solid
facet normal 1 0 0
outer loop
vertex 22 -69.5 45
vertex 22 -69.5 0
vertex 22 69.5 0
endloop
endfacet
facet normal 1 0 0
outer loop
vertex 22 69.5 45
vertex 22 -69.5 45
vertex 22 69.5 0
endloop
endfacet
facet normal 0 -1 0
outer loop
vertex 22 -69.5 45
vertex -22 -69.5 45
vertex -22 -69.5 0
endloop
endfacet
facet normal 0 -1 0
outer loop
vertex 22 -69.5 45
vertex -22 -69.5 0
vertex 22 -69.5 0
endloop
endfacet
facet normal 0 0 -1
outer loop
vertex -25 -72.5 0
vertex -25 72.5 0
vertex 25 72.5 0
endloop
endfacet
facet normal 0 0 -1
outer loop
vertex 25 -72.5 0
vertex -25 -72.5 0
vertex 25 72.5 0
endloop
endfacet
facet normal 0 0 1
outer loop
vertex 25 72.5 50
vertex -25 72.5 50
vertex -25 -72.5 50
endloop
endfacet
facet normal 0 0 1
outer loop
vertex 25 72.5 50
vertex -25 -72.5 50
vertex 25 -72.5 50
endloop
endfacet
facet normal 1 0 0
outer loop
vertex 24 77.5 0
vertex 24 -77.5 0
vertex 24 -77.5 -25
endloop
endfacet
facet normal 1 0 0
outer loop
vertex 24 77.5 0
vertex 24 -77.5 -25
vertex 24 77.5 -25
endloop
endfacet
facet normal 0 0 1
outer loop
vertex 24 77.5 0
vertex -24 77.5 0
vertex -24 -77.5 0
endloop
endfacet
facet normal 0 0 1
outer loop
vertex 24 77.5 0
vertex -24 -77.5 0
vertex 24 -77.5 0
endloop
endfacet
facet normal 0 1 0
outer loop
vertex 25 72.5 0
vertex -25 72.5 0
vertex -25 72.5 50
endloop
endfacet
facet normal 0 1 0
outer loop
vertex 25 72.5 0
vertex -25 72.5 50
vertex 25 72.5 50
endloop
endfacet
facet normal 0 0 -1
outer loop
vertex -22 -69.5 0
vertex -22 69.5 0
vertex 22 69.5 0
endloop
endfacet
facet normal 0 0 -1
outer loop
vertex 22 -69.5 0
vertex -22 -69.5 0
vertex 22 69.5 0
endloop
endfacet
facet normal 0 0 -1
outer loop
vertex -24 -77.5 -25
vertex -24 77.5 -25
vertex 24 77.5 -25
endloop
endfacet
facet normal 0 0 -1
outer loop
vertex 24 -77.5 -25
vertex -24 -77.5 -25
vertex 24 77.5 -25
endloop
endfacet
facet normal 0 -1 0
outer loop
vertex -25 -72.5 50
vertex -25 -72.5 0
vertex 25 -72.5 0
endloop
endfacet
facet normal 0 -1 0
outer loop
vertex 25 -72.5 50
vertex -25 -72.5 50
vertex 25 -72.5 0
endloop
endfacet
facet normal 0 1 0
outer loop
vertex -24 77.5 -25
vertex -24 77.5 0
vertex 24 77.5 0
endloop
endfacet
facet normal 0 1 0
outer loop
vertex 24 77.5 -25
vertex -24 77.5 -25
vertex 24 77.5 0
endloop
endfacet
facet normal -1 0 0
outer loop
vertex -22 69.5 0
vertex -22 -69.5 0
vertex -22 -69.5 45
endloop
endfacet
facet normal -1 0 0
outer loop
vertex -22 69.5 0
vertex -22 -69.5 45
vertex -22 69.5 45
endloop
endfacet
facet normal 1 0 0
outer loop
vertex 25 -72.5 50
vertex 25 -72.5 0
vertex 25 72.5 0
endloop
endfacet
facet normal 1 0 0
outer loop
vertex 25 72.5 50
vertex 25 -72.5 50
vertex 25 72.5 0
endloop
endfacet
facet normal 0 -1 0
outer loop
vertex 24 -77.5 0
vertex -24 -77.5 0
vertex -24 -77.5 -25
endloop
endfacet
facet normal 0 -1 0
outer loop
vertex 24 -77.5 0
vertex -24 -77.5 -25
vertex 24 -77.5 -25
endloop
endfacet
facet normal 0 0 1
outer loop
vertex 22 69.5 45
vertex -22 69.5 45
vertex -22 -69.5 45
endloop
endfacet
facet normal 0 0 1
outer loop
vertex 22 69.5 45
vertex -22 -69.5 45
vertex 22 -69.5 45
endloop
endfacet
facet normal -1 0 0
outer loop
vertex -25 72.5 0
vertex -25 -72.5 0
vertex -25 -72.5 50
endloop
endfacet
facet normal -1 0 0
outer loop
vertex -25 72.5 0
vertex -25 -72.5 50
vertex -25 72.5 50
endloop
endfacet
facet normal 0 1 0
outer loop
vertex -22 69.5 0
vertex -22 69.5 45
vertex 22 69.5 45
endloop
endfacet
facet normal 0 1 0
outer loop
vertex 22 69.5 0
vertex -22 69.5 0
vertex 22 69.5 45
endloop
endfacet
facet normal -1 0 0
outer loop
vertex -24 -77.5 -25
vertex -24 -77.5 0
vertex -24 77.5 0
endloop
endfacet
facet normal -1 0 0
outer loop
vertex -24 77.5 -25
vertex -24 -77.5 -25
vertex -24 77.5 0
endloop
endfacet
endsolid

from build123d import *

# Parameters (mm, degrees)
F0_W     = 44
F0_H     = 139
F1_DEPTH = 45
F2_W     = 50
F2_H     = 145
F3_DEPTH = 50
F4_W     = 48
F4_H     = 155
F5_DEPTH = 25


with BuildPart() as f1:
    # F0 (on Top) → F1 (new body)
    with BuildSketch(Plane.XY):
        Rectangle(F0_W, F0_H)
    extrude(amount=F1_DEPTH)


with BuildPart() as f3:
    # F2 (on Top) → F3 (new body)
    with BuildSketch(Plane.XY):
        Rectangle(F2_W, F2_H)
    extrude(amount=F3_DEPTH)


with BuildPart() as f5:
    # F4 (on Top) → F5 (new body)
    with BuildSketch(Plane.XY):
        Rectangle(F4_W, F4_H)
    extrude(amount=-F5_DEPTH)


solid = Compound([f1.part, f3.part, f5.part])
